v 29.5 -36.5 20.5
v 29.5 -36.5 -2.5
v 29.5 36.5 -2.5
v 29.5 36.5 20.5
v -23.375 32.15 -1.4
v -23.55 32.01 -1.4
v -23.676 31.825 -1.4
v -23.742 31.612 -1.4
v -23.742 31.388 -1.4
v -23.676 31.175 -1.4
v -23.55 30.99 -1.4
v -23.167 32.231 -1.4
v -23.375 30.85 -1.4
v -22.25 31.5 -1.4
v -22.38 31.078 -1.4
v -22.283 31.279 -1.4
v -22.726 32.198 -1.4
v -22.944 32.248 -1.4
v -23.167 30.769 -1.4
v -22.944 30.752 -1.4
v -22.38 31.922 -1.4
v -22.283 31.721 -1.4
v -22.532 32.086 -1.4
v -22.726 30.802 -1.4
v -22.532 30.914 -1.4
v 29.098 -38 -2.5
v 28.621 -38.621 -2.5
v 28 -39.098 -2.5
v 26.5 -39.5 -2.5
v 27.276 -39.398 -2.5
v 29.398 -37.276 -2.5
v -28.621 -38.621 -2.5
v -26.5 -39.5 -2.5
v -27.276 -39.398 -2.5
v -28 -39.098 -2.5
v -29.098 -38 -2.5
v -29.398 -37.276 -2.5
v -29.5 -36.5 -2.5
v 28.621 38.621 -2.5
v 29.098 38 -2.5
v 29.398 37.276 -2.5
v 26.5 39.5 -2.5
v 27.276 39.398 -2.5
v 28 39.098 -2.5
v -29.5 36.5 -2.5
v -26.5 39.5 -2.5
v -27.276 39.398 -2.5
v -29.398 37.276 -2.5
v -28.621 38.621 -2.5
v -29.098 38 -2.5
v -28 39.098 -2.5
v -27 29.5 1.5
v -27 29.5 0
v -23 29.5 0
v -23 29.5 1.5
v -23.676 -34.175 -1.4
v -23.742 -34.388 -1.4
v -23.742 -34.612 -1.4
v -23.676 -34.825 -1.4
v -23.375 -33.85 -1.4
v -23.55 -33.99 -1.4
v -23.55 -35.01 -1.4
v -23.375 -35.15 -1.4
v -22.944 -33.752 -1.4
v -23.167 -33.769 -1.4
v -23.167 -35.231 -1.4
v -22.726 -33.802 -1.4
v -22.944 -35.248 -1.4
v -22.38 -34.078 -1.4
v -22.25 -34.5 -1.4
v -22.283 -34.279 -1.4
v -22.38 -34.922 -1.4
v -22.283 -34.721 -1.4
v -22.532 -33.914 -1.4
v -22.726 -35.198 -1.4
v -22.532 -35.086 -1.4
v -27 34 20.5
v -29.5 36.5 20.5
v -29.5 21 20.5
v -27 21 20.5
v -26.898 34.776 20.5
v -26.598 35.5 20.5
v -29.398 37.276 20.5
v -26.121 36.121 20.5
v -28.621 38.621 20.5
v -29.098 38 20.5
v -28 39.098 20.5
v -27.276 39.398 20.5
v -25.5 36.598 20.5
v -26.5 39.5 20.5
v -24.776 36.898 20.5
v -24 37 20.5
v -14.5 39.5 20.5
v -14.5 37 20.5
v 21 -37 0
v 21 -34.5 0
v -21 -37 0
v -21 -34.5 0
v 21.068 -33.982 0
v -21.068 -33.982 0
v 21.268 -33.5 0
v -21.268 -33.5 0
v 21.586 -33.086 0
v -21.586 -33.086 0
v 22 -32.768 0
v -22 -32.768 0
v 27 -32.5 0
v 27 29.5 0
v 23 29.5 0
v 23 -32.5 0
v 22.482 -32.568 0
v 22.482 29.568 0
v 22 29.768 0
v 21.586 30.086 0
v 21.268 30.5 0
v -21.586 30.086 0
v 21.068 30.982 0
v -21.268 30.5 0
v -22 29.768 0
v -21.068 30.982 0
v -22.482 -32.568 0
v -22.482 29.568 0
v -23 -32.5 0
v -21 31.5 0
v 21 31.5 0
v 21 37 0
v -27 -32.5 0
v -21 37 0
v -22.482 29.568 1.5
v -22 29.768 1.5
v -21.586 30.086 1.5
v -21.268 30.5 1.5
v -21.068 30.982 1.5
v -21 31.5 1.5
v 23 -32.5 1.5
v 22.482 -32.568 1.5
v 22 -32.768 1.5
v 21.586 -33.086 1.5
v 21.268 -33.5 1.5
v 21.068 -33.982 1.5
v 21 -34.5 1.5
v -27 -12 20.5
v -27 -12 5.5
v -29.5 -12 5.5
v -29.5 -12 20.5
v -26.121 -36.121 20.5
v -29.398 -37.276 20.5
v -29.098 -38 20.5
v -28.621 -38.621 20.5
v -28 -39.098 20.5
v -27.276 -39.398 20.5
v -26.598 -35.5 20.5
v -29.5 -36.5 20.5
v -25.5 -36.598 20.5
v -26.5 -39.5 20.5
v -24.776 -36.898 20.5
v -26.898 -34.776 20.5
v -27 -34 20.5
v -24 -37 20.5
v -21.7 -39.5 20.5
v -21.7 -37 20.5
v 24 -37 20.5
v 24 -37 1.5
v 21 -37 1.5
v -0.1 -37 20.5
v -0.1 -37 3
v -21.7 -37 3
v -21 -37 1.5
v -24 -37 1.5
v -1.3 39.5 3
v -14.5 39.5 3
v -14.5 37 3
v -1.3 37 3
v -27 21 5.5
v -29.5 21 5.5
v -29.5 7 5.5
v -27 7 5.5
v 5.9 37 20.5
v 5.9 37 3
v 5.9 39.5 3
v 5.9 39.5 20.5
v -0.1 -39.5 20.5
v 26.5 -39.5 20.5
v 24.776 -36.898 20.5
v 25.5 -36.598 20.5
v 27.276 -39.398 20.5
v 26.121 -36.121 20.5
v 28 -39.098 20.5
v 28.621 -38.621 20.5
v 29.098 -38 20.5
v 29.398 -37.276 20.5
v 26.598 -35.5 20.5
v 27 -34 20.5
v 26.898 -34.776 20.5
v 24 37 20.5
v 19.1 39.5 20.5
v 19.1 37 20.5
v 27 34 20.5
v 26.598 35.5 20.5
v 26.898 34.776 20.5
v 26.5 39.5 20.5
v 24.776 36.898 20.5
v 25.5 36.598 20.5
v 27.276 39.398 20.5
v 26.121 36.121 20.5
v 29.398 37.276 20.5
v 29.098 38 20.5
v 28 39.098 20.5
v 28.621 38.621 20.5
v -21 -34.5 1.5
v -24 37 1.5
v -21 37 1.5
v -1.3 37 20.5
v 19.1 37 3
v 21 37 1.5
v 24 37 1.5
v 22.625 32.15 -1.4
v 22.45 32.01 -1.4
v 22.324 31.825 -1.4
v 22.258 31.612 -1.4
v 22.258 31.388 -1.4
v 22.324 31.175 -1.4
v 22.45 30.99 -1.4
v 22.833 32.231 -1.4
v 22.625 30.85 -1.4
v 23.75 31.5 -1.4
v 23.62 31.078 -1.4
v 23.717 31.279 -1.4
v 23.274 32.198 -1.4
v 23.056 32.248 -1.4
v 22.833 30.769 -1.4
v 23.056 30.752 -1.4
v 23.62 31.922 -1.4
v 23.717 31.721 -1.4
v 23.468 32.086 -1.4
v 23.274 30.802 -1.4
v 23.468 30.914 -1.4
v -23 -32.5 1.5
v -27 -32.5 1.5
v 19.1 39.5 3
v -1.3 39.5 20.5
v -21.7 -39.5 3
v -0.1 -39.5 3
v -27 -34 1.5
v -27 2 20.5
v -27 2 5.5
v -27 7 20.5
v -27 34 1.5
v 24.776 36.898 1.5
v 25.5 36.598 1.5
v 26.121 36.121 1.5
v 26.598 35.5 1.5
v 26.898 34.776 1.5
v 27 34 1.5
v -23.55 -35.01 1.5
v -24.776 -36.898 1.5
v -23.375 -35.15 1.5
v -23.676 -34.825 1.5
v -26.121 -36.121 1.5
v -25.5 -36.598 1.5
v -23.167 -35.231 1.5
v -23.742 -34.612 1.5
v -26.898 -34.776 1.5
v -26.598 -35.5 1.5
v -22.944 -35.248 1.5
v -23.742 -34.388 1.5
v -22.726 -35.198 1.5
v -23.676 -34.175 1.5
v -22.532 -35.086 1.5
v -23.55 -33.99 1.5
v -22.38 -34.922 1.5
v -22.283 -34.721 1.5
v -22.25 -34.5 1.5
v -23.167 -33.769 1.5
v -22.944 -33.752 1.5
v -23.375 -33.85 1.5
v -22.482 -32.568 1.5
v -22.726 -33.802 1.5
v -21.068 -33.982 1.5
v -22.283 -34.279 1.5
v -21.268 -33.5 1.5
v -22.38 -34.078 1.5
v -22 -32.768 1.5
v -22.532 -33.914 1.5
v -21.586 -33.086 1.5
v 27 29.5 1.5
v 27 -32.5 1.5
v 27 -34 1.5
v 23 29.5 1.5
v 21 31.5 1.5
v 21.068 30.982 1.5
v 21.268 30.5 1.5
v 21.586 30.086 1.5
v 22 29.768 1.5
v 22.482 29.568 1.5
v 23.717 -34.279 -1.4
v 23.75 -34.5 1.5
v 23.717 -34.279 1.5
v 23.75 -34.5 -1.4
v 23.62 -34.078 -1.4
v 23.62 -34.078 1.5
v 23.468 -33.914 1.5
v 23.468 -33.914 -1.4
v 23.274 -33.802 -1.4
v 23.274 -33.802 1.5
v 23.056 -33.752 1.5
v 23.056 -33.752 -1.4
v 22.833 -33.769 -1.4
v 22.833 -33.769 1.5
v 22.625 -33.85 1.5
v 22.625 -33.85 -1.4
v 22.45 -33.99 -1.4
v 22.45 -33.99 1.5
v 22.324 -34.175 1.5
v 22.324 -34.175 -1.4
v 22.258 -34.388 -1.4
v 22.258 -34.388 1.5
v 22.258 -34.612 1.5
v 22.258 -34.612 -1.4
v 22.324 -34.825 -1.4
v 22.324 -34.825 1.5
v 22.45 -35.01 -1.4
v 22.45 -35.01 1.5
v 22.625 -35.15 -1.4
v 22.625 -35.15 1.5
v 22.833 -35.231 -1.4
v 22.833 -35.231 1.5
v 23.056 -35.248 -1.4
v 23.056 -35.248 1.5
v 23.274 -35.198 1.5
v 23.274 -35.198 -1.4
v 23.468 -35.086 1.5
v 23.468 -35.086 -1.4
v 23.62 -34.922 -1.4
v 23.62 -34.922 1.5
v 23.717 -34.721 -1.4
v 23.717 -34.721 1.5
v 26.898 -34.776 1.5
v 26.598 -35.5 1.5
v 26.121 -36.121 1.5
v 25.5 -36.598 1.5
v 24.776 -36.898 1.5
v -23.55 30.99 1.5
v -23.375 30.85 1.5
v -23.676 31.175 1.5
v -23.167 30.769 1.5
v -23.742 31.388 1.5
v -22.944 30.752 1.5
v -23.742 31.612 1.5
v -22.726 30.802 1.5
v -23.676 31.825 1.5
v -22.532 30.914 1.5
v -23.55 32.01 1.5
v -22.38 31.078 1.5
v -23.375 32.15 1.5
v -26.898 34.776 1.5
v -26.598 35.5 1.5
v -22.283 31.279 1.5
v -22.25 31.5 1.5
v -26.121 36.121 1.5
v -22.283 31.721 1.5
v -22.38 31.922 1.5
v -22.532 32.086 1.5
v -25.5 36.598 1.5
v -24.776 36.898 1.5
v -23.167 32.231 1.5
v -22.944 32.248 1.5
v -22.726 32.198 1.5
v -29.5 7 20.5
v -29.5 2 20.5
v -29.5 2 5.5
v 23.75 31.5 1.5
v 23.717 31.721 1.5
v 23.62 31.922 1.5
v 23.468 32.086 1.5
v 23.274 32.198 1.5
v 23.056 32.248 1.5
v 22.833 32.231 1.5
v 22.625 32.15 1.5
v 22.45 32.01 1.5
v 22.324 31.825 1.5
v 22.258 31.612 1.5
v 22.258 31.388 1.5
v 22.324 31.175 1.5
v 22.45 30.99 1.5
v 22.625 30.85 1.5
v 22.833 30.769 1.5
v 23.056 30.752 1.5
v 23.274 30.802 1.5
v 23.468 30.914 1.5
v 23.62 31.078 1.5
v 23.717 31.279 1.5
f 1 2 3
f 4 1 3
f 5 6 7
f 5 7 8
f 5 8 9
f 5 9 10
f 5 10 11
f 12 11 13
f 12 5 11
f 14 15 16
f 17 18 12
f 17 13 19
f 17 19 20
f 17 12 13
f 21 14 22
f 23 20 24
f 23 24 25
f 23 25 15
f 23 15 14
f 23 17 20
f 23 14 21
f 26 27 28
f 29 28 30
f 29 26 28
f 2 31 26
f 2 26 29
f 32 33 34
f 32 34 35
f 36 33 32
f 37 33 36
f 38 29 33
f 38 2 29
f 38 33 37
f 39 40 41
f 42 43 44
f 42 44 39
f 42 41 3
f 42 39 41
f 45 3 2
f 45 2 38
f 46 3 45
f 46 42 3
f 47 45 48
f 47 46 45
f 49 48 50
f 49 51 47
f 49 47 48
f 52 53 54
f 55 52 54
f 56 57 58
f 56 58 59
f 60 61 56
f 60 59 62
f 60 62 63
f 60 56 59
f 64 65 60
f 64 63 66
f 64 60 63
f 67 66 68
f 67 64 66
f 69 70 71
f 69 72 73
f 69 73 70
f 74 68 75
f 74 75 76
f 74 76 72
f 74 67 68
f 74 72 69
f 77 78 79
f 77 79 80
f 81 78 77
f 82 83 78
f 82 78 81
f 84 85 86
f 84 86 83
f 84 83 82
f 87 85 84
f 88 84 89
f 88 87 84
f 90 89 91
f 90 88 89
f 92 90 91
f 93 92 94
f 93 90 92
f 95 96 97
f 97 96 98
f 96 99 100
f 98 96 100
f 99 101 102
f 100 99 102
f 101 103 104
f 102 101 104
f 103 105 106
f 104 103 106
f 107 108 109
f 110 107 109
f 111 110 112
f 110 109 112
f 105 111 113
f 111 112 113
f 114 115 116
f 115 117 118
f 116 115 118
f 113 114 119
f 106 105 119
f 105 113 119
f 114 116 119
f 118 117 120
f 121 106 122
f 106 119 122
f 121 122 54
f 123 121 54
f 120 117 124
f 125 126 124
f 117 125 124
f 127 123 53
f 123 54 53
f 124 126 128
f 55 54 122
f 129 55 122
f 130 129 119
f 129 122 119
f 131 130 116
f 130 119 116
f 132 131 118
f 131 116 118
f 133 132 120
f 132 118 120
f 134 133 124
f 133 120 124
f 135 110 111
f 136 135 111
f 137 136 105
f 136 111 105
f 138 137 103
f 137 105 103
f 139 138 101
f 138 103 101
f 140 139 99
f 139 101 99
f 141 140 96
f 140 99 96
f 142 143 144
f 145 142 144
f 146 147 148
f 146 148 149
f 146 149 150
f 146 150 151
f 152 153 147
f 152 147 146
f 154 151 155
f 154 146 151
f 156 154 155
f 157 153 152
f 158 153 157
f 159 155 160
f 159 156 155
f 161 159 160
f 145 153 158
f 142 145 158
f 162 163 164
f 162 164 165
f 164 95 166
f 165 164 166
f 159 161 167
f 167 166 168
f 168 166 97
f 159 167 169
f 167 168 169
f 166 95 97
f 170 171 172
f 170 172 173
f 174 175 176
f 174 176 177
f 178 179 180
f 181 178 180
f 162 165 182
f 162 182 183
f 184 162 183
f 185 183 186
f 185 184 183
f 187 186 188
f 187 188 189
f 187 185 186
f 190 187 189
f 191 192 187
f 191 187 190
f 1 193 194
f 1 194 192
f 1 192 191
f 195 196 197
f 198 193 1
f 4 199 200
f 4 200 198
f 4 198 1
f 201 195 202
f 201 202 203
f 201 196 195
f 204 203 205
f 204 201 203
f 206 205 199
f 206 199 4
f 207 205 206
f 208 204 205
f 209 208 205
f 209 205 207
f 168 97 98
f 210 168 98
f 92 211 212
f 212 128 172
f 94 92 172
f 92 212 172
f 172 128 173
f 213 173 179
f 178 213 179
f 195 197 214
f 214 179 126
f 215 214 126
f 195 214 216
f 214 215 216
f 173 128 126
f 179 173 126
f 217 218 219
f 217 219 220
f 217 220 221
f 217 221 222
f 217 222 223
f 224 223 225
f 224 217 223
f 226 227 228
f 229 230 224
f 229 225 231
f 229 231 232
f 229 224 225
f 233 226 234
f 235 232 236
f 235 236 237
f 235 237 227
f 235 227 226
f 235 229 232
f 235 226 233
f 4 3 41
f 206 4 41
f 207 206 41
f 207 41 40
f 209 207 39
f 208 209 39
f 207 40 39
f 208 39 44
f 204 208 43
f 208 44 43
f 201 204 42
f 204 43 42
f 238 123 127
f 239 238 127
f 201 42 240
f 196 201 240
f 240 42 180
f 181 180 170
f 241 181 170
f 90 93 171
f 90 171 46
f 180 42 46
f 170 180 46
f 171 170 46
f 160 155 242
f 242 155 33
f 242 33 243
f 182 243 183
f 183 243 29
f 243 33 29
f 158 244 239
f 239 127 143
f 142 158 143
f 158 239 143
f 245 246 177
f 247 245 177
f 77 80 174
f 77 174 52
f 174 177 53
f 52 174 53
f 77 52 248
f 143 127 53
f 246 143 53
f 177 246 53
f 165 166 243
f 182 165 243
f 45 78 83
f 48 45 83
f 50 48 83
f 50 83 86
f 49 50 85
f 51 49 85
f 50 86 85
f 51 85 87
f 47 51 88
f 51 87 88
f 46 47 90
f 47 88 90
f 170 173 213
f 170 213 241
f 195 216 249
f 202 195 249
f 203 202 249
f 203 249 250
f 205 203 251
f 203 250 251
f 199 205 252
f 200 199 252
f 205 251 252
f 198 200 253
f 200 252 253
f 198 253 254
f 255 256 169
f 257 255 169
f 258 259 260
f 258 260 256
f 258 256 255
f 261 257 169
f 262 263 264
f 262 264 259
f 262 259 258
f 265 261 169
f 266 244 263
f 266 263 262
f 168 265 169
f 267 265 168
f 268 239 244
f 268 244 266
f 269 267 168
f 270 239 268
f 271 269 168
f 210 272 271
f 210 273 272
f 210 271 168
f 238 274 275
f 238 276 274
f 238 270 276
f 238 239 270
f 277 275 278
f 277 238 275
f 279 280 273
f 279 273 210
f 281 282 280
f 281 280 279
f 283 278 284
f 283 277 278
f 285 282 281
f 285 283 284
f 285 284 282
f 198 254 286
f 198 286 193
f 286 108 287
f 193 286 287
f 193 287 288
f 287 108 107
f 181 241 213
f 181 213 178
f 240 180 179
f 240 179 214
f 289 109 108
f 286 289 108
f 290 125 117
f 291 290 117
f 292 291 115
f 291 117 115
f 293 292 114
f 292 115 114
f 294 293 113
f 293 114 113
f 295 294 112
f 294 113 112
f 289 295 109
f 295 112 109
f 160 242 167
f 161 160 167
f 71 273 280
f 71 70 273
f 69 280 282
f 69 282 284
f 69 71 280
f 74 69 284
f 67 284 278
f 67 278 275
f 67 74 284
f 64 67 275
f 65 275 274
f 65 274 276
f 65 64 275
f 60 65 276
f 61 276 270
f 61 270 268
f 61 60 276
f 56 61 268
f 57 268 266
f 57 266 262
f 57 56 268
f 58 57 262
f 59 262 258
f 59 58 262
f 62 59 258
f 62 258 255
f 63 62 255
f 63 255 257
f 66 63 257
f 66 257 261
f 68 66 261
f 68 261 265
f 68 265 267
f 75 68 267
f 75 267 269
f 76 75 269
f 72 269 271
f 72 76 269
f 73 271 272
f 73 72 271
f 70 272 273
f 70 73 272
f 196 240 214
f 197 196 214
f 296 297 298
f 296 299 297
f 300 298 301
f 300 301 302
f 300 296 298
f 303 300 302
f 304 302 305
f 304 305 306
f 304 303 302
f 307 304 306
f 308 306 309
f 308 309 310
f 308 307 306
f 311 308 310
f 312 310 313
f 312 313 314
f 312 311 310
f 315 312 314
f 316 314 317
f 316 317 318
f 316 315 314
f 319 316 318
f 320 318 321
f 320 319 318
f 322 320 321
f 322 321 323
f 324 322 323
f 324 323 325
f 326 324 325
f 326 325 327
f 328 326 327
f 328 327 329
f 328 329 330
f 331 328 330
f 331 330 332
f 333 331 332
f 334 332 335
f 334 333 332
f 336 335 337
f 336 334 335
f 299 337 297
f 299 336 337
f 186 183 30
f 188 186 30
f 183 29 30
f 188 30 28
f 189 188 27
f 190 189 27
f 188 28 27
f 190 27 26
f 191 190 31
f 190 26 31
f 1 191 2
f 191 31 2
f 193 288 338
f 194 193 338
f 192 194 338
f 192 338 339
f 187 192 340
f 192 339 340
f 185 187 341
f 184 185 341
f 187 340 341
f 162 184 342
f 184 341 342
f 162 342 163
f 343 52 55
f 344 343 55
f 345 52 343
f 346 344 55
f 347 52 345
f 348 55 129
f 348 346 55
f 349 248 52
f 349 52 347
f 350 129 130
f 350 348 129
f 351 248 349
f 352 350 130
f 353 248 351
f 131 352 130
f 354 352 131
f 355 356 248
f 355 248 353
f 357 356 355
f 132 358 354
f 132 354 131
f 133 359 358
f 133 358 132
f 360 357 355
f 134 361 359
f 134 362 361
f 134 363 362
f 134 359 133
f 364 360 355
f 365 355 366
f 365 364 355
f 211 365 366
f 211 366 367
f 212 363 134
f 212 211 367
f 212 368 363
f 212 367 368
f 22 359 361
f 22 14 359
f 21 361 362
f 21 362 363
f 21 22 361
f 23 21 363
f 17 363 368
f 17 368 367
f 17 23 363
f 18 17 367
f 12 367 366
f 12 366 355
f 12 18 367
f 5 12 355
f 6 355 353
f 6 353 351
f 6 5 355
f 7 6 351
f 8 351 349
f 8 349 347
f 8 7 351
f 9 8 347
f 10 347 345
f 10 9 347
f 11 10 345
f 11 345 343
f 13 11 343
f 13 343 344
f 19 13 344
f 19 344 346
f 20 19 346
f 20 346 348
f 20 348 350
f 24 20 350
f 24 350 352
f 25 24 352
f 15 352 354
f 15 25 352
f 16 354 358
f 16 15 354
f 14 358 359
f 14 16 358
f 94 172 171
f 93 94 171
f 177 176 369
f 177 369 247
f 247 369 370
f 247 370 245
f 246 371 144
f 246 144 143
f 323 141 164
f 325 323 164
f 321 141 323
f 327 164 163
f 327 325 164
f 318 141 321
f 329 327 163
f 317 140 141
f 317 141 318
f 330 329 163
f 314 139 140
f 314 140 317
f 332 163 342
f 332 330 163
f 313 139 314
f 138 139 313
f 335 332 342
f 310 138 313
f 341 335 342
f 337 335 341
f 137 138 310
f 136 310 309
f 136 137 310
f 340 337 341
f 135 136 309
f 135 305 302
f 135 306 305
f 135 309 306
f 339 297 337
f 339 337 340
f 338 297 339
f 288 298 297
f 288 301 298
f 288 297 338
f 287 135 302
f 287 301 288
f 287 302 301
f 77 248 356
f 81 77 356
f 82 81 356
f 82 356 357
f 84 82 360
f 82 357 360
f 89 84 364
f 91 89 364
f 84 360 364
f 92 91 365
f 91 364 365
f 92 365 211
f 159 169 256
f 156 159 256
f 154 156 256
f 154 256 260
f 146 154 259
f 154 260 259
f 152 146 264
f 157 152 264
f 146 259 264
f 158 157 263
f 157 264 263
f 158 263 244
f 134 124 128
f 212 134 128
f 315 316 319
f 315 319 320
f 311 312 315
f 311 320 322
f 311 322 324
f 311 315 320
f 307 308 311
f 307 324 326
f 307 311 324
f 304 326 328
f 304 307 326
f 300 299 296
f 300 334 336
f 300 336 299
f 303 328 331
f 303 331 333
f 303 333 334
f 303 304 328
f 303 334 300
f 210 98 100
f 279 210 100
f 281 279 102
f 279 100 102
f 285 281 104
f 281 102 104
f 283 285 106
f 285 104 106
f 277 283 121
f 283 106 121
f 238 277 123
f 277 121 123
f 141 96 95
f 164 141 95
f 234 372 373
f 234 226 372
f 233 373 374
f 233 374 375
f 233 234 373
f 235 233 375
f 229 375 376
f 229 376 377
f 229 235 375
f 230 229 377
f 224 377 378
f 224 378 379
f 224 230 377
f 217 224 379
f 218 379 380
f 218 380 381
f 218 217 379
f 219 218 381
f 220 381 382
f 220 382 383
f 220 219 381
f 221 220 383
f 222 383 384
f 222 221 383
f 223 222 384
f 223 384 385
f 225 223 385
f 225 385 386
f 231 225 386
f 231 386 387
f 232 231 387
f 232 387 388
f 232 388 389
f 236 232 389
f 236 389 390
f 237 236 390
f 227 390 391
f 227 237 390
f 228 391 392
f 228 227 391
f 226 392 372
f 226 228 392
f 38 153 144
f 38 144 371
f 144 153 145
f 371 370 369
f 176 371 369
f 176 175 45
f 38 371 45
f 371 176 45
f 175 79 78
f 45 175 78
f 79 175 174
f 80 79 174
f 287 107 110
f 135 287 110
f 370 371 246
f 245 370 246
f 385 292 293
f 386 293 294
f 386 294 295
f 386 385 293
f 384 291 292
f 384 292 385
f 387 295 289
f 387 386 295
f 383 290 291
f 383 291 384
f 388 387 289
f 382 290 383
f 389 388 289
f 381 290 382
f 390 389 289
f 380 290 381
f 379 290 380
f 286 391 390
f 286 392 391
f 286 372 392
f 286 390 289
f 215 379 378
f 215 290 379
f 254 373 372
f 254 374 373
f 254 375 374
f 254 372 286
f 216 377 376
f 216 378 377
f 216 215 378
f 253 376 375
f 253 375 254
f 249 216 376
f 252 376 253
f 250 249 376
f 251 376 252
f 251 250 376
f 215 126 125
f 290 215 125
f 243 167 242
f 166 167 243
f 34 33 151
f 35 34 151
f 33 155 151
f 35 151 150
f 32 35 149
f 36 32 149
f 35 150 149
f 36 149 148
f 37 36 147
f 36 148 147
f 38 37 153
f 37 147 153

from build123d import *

# Parameters (mm, degrees)
EXTRUDE_1_DEPTH     = 2.5
SKETCH_1_5_R        = 0.75
EXTRUDE_3_DEPTH     = 1.5
SKETCH_1_6_W        = 13.2
SKETCH_1_6_H        = 2.5
SKETCH_1_6_W_2      = 21.6
EXTRUDE_4_DEPTH     = 3
SKETCH_1_7_W        = 2.5
SKETCH_1_7_H        = 14
EXTRUDE_5_DEPTH     = 5.5
SKETCH_1_8_W        = 7.2
SKETCH_1_8_H        = 2.5
SKETCH_1_8_W_2      = 2.5
SKETCH_1_8_H_2      = 5
EXTRUDE_6_DEPTH     = 20.5
CUT_EXTRUDE_START   = -1.4
SKETCH_1_9_R        = 0.75
CUT_EXTRUDE_1_DEPTH = 1.4


with BuildPart() as part:
    # 草图1 → 凸台-拉伸1 (new body)
    with BuildSketch(Plane.XY):
        with BuildLine():
            Line((-26.5, 39.5), (26.5, 39.5))
            ThreePointArc((26.5, 39.5), (28.621320344, 38.621320344), (29.5, 36.5))
            Line((29.5, 36.5), (29.5, -36.5))
            ThreePointArc((29.5, -36.5), (28.621320344, -38.621320344), (26.5, -39.5))
            Line((26.5, -39.5), (-26.5, -39.5))
            ThreePointArc((-26.5, -39.5), (-28.621320344, -38.621320344), (-29.5, -36.5))
            Line((-29.5, -36.5), (-29.5, 36.5))
            ThreePointArc((-29.5, 36.5), (-28.621320344, 38.621320344), (-26.5, 39.5))
        make_face()
    extrude(amount=-EXTRUDE_1_DEPTH)

    # 草图1<5> → 凸台-拉伸3 (add)
    # profile 1 of 4: a face of its own
    with BuildSketch(Plane.XY):
        with BuildLine():
            Line((-21, 31.5), (-21, 37))
            Line((-21, 37), (-24, 37))
            ThreePointArc((-24, 37), (-26.121320344, 36.121320344), (-27, 34))
            Line((-27, 34), (-27, 29.5))
            Line((-27, 29.5), (-23, 29.5))
            ThreePointArc((-23, 29.5), (-21.585786438, 30.085786438), (-21, 31.5))
        make_face()
        with Locations((-23, 31.5)):
            Circle(SKETCH_1_5_R, mode=Mode.SUBTRACT)
    # profile 2 of 4: a face of its own
    with BuildSketch(Plane.XY):
        with BuildLine():
            Line((24, 37), (21, 37))
            Line((21, 37), (21, 31.5))
            ThreePointArc((21, 31.5), (21.585786438, 30.085786438), (23, 29.5))
            Line((23, 29.5), (27, 29.5))
            Line((27, 29.5), (27, 34))
            ThreePointArc((27, 34), (26.121320344, 36.121320344), (24, 37))
        make_face()
        with Locations((23, 31.5)):
            Circle(SKETCH_1_5_R, mode=Mode.SUBTRACT)
    # profile 3 of 4: a face of its own
    with BuildSketch(Plane.XY):
        with BuildLine():
            Line((-23, -32.5), (-27, -32.5))
            Line((-27, -32.5), (-27, -34))
            ThreePointArc((-27, -34), (-26.121320344, -36.121320344), (-24, -37))
            Line((-24, -37), (-21, -37))
            Line((-21, -37), (-21, -34.5))
            ThreePointArc((-21, -34.5), (-21.585786438, -33.085786438), (-23, -32.5))
        make_face()
        with Locations((-23, -34.5)):
            Circle(SKETCH_1_5_R, mode=Mode.SUBTRACT)
    # profile 4 of 4: a face of its own
    with BuildSketch(Plane.XY):
        with BuildLine():
            Line((27, -34), (27, -32.5))
            Line((27, -32.5), (23, -32.5))
            ThreePointArc((23, -32.5), (21.585786438, -33.085786438), (21, -34.5))
            Line((21, -34.5), (21, -37))
            Line((21, -37), (24, -37))
            ThreePointArc((24, -37), (26.121320344, -36.121320344), (27, -34))
        make_face()
        with Locations((23, -34.5)):
            Circle(SKETCH_1_5_R, mode=Mode.SUBTRACT)
    extrude(amount=EXTRUDE_3_DEPTH)

    # 草图1<6> → 凸台-拉伸4 (add)
    with BuildSketch(Plane.XY):
        with Locations((-7.9, 38.25)):
            Rectangle(SKETCH_1_6_W, SKETCH_1_6_H)
        with Locations((12.5, 38.25)):
            Rectangle(SKETCH_1_6_W, SKETCH_1_6_H)
        with Locations((-10.9, -38.25)):
            Rectangle(SKETCH_1_6_W_2, SKETCH_1_6_H)
    extrude(amount=EXTRUDE_4_DEPTH)

    # 草图1<7> → 凸台-拉伸5 (add)
    with BuildSketch(Plane.XY):
        with Locations((-28.25, 14)):
            Rectangle(SKETCH_1_7_W, SKETCH_1_7_H)
        with Locations((-28.25, -5)):
            Rectangle(SKETCH_1_7_W, SKETCH_1_7_H)
    extrude(amount=EXTRUDE_5_DEPTH)

    # 草图1<8> → 凸台-拉伸6 (add)
    with BuildSketch(Plane.XY):
        with BuildLine():
            Line((-14.5, 39.5), (-26.5, 39.5))
            ThreePointArc((-26.5, 39.5), (-28.621320344, 38.621320344), (-29.5, 36.5))
            Line((-29.5, 36.5), (-29.5, 21))
            Line((-29.5, 21), (-27, 21))
            Line((-27, 21), (-27, 34))
            ThreePointArc((-27, 34), (-26.121320344, 36.121320344), (-24, 37))
            Line((-24, 37), (-14.5, 37))
            Line((-14.5, 37), (-14.5, 39.5))
        make_face()
        with Locations((2.3, 38.25)):
            Rectangle(SKETCH_1_8_W, SKETCH_1_8_H)
        with Locations((-28.25, 4.5)):
            Rectangle(SKETCH_1_8_W_2, SKETCH_1_8_H_2)
        with BuildLine():
            Line((26.5, 39.5), (19.1, 39.5))
            Line((19.1, 39.5), (19.1, 37))
            Line((19.1, 37), (24, 37))
            ThreePointArc((24, 37), (26.121320344, 36.121320344), (27, 34))
            Line((27, 34), (27, -34))
            ThreePointArc((27, -34), (26.121320344, -36.121320344), (24, -37))
            Line((24, -37), (-0.1, -37))
            Line((-0.1, -37), (-0.1, -39.5))
            Line((-0.1, -39.5), (26.5, -39.5))
            ThreePointArc((26.5, -39.5), (28.621320344, -38.621320344), (29.5, -36.5))
            Line((29.5, -36.5), (29.5, 36.5))
            ThreePointArc((29.5, 36.5), (28.621320344, 38.621320344), (26.5, 39.5))
        make_face()
        with BuildLine():
            Line((-27, -12), (-29.5, -12))
            Line((-29.5, -12), (-29.5, -36.5))
            ThreePointArc((-29.5, -36.5), (-28.621320344, -38.621320344), (-26.5, -39.5))
            Line((-26.5, -39.5), (-21.7, -39.5))
            Line((-21.7, -39.5), (-21.7, -37))
            Line((-21.7, -37), (-24, -37))
            ThreePointArc((-24, -37), (-26.121320344, -36.121320344), (-27, -34))
            Line((-27, -34), (-27, -12))
        make_face()
    extrude(amount=EXTRUDE_6_DEPTH)

    # 草图1<9> → 切除-拉伸1 (cut)
    with BuildSketch(Plane.XY.offset(CUT_EXTRUDE_START)):
        with Locations((-23, 31.5)):
            Circle(SKETCH_1_9_R)
        with Locations((23, 31.5)):
            Circle(SKETCH_1_9_R)
        with Locations((23, -34.5)):
            Circle(SKETCH_1_9_R)
        with Locations((-23, -34.5)):
            Circle(SKETCH_1_9_R)
    extrude(amount=CUT_EXTRUDE_1_DEPTH, mode=Mode.SUBTRACT)


solid = part.part
